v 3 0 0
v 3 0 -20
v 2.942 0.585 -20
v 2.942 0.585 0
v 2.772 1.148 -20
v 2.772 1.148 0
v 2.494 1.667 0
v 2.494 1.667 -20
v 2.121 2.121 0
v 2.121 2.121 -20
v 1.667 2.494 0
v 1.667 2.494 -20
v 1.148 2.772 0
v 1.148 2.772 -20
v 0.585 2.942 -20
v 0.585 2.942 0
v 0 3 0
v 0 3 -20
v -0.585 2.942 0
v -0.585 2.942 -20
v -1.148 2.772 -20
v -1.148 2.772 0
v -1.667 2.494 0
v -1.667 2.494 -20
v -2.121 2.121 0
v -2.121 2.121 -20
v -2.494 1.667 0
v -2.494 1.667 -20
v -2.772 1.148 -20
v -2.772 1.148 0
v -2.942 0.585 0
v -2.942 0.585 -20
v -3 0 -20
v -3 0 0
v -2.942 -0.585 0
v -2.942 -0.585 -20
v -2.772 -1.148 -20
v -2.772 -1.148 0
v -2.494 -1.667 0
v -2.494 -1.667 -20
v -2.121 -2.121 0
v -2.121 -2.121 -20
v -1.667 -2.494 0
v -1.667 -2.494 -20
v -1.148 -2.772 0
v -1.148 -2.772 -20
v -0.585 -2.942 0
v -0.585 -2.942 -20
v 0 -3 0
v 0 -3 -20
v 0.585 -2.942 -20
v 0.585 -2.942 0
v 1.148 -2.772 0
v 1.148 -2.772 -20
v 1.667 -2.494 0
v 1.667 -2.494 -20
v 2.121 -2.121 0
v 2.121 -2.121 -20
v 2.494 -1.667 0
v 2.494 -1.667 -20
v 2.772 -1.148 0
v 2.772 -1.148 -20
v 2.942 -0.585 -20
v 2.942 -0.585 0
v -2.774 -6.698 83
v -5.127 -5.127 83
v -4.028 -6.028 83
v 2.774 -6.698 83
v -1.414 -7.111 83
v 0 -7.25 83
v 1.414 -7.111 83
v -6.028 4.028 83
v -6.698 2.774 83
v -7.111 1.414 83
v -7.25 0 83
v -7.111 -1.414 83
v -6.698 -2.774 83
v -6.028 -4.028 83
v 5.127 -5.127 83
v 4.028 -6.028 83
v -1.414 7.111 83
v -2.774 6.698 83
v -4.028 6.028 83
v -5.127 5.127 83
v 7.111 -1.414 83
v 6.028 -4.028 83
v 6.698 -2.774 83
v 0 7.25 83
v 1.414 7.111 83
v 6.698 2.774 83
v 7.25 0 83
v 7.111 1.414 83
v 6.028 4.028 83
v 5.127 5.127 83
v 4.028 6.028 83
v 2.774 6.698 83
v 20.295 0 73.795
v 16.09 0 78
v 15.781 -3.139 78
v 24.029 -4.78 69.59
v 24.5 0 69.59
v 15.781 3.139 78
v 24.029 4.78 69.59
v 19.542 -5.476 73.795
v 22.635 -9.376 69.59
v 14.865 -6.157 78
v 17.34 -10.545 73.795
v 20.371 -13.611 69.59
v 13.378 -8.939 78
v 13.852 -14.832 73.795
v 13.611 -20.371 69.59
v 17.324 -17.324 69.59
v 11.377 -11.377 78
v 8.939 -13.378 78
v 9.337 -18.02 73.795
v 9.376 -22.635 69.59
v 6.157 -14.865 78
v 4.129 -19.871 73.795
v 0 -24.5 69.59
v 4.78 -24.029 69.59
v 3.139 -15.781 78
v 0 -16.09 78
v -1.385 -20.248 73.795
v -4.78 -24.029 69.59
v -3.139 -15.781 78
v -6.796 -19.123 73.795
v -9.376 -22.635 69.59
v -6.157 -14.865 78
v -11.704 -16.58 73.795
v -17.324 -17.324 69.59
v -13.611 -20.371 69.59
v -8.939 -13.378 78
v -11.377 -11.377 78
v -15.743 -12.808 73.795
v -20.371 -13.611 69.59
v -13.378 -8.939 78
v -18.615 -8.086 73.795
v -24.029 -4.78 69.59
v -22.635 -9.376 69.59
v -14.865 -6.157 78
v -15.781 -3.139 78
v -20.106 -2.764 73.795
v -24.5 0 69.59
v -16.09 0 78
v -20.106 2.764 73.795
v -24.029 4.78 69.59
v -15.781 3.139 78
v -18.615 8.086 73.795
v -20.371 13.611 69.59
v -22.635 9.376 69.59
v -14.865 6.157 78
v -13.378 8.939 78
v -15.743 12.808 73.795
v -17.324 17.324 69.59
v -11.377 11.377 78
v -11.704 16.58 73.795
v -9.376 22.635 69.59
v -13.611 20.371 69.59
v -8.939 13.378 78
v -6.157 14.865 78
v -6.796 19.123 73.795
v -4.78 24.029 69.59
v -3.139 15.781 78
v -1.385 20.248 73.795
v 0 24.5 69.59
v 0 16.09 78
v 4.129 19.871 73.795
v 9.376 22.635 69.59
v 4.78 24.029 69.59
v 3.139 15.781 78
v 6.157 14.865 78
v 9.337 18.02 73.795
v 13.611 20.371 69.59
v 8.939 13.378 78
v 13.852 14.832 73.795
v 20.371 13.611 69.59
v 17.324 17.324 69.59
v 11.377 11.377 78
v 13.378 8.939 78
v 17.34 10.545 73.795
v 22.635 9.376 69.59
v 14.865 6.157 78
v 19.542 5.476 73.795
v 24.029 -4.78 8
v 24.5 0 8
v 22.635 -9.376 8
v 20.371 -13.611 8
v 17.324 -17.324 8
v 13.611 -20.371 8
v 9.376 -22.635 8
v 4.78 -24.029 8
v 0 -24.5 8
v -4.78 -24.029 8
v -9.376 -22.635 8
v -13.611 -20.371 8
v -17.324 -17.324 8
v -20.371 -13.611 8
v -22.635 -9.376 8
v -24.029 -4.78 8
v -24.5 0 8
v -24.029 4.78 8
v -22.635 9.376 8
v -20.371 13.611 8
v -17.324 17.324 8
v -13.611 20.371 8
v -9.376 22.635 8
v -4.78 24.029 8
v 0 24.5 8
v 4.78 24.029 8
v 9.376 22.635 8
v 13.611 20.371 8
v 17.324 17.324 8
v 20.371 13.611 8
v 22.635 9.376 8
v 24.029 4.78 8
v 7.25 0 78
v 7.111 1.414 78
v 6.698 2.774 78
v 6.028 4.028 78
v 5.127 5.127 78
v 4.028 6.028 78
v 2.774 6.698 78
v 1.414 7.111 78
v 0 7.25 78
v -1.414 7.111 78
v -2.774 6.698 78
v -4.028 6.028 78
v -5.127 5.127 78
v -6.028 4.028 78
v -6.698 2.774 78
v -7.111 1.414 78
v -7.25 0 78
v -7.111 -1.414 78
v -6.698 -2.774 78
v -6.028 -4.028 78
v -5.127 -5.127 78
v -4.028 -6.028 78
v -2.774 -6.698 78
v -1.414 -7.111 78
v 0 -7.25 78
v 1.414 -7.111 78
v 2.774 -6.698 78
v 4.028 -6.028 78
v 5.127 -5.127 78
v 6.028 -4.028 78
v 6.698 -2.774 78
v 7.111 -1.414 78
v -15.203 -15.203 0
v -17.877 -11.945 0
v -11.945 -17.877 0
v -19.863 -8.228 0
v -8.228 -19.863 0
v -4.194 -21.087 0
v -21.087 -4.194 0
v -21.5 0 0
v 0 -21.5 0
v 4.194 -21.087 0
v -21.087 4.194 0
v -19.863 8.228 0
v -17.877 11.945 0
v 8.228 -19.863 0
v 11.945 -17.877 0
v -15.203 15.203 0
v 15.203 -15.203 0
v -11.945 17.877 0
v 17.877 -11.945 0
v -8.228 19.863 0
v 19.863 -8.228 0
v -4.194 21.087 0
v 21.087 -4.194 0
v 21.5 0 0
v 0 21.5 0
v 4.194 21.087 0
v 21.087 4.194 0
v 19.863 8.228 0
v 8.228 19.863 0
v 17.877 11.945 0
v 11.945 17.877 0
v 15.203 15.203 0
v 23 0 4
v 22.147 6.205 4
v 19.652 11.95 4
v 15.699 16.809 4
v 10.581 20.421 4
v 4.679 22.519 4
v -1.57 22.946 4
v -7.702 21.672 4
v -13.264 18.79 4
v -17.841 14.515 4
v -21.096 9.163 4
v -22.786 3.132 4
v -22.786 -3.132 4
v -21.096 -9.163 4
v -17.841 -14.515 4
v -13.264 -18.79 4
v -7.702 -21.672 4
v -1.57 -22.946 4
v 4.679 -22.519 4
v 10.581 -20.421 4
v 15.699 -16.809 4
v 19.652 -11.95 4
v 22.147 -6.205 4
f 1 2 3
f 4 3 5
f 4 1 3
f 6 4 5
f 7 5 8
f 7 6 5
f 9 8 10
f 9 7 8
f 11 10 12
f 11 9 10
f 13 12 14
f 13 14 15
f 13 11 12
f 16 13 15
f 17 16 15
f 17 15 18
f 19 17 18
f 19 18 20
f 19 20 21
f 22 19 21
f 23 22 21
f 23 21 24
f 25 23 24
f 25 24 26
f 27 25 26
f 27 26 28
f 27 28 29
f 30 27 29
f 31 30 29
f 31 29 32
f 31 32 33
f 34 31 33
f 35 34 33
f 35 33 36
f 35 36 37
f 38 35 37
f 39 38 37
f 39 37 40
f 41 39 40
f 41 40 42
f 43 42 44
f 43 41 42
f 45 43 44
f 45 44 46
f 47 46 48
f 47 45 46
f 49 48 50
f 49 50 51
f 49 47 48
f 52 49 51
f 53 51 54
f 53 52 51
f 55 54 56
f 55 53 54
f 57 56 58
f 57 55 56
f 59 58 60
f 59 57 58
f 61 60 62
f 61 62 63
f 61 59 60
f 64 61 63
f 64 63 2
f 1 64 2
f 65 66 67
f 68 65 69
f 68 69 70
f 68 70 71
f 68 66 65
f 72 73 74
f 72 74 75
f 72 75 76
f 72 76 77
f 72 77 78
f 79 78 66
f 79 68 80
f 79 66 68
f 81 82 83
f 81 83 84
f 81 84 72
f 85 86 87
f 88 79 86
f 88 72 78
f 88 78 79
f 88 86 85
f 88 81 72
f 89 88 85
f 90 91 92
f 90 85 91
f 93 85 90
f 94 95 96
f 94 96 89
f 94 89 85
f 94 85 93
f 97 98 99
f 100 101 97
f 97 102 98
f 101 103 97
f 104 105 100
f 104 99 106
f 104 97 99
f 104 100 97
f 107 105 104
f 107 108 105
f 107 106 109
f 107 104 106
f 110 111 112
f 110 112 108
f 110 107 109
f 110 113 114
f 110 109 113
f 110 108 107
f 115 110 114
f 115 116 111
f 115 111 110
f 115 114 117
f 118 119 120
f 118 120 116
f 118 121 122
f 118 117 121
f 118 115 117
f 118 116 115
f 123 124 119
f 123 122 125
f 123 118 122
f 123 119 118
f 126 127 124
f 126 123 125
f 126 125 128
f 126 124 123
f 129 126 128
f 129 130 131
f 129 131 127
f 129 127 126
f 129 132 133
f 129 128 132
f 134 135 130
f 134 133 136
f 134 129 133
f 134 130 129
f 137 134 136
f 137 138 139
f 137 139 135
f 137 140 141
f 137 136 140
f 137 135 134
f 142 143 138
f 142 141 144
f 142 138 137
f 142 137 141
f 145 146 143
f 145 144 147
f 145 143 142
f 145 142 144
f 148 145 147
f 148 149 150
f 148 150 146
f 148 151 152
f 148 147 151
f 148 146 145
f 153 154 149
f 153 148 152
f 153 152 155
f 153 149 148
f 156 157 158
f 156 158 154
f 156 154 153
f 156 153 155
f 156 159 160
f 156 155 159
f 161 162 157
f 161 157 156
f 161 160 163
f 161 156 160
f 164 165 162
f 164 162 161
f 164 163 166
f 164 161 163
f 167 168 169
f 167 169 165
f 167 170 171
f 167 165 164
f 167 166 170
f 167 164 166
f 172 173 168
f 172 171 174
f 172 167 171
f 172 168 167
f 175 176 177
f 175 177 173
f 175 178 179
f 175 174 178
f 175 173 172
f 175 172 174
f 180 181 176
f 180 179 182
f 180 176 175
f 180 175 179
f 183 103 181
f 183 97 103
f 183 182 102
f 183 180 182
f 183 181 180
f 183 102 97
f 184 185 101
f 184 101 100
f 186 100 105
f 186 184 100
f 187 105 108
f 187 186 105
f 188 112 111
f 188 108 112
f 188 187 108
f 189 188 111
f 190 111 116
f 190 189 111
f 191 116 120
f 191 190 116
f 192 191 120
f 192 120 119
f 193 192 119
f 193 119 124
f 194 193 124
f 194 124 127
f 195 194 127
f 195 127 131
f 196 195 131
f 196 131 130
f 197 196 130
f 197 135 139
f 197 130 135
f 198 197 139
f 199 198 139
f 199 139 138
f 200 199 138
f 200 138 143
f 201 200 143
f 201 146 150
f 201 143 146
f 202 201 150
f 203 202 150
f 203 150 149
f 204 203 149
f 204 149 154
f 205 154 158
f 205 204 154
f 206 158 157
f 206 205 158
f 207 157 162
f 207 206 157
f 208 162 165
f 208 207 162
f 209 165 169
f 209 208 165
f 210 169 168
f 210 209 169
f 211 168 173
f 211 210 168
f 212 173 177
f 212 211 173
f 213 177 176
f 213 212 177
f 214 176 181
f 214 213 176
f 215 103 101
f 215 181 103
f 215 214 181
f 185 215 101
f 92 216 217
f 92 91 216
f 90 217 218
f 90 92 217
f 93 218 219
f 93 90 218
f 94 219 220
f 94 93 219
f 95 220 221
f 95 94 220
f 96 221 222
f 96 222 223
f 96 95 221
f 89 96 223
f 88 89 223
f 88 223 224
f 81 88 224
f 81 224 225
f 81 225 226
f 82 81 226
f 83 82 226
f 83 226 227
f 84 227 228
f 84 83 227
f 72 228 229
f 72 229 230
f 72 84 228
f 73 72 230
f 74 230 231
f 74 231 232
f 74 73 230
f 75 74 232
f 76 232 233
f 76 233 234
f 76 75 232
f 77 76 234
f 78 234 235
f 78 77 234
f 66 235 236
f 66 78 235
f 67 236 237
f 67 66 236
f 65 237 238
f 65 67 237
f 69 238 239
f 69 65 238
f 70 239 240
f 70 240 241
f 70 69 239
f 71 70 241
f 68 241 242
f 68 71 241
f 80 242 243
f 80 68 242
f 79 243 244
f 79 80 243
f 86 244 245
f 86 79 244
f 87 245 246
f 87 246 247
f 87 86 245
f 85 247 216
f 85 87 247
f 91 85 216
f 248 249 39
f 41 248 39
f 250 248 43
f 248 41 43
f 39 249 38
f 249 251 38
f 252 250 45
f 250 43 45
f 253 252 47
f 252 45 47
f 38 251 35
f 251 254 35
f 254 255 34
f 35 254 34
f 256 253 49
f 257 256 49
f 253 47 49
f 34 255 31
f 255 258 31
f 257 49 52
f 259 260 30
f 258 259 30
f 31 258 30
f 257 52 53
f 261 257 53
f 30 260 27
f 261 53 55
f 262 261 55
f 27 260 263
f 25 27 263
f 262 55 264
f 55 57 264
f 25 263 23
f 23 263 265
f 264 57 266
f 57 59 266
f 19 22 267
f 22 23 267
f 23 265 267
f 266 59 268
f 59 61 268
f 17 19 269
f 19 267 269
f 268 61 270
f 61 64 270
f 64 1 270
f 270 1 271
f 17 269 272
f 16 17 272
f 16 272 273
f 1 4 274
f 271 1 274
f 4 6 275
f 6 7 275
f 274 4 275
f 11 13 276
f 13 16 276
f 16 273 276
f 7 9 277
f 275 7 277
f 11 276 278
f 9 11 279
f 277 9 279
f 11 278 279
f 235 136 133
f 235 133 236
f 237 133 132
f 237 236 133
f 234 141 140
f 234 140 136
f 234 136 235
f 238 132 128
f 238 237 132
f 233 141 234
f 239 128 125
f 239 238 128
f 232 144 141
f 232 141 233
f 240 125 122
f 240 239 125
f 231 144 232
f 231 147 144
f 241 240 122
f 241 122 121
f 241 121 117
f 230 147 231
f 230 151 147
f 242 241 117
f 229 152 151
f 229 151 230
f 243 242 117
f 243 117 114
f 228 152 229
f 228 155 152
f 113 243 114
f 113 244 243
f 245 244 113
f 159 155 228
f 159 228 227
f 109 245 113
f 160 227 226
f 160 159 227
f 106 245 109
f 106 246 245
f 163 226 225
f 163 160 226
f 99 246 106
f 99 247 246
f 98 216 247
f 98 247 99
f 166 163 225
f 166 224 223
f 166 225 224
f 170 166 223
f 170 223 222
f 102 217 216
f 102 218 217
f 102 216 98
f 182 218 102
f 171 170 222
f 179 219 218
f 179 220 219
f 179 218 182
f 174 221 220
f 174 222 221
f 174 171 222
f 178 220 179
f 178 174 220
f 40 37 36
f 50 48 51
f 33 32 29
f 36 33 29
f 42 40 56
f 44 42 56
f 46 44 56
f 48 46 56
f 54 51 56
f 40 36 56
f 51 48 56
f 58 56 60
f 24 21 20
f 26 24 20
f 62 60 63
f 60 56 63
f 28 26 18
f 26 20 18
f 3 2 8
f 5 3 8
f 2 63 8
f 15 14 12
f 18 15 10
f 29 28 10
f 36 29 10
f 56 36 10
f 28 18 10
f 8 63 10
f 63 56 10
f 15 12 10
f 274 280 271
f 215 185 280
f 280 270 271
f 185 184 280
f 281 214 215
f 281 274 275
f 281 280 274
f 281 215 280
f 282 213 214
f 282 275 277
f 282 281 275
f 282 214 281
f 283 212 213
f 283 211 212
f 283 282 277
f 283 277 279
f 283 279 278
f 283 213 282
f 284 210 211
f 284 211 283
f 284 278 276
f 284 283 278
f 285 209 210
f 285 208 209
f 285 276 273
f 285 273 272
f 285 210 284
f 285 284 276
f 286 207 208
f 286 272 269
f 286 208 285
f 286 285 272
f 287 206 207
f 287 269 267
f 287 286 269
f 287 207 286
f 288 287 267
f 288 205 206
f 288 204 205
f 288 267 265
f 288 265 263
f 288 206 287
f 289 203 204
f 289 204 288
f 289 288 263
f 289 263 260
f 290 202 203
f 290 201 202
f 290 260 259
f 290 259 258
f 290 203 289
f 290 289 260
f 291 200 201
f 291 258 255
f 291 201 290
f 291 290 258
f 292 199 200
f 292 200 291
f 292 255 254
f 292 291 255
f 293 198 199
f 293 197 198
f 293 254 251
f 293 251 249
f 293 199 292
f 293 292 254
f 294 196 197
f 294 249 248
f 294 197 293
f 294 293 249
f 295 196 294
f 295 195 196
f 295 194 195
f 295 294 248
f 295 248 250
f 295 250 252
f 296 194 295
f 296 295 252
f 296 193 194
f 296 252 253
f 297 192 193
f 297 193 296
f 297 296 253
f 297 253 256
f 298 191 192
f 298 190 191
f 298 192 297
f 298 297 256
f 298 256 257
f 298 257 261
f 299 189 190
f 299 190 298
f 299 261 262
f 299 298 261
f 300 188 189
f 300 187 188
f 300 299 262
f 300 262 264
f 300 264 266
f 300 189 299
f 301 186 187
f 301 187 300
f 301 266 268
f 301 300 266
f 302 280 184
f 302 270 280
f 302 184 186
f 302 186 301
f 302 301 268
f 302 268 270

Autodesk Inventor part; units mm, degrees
ref_plane "YZ Plane" through (0, 0, 0) normal (1, 0, 0) x (0, 1, 0)
ref_plane "XZ Plane" through (0, 0, 0) normal (0, 1, 0) x (-1, 0, 0)
ref_plane "XY Plane" through (0, 0, 0) normal (0, 0, 1) x (1, 0, 0)
sketch "Sketch1" plane through (0, 0, 0) normal (0, 0, 1) x (1, 0, 0)
  circle A0 centre (0, 0) radius 24.5
  dimension "d0" = 49
extrude "Extrusion1" add sketch "Sketch1" along normal blind 83
sketch "Sketch2" plane through (0, 0, 0) normal (0, 0, 1) x (1, 0, 0)
  circle A0 centre (0, 0) radius 3
  dimension "d3" = 6
extrude "Extrusion2" add sketch "Sketch2" against normal blind 20
chamfer "Chamfer1" distance 3 distance2 8 1 edges at (-24.5, 0, 0) measured on face at (17.067, -2.1937, 0)
sketch "Sketch4" plane through (0, 0, 83) normal (0, 0, 1) x (1, 0, 0)
  circle A0 centre (0, 0) radius 7.25
  circle A1 centre (0, 0) radius 24.5 projected
  dimension "d10" = 14.5
extrude "Extrusion3" cut sketch "Sketch4" against normal blind 5
chamfer "Chamfer2" distance 8.41 angle 45 1 edges at (-24.5, 0, 78)
properties part number "Motor SK3 5065 275KV"
